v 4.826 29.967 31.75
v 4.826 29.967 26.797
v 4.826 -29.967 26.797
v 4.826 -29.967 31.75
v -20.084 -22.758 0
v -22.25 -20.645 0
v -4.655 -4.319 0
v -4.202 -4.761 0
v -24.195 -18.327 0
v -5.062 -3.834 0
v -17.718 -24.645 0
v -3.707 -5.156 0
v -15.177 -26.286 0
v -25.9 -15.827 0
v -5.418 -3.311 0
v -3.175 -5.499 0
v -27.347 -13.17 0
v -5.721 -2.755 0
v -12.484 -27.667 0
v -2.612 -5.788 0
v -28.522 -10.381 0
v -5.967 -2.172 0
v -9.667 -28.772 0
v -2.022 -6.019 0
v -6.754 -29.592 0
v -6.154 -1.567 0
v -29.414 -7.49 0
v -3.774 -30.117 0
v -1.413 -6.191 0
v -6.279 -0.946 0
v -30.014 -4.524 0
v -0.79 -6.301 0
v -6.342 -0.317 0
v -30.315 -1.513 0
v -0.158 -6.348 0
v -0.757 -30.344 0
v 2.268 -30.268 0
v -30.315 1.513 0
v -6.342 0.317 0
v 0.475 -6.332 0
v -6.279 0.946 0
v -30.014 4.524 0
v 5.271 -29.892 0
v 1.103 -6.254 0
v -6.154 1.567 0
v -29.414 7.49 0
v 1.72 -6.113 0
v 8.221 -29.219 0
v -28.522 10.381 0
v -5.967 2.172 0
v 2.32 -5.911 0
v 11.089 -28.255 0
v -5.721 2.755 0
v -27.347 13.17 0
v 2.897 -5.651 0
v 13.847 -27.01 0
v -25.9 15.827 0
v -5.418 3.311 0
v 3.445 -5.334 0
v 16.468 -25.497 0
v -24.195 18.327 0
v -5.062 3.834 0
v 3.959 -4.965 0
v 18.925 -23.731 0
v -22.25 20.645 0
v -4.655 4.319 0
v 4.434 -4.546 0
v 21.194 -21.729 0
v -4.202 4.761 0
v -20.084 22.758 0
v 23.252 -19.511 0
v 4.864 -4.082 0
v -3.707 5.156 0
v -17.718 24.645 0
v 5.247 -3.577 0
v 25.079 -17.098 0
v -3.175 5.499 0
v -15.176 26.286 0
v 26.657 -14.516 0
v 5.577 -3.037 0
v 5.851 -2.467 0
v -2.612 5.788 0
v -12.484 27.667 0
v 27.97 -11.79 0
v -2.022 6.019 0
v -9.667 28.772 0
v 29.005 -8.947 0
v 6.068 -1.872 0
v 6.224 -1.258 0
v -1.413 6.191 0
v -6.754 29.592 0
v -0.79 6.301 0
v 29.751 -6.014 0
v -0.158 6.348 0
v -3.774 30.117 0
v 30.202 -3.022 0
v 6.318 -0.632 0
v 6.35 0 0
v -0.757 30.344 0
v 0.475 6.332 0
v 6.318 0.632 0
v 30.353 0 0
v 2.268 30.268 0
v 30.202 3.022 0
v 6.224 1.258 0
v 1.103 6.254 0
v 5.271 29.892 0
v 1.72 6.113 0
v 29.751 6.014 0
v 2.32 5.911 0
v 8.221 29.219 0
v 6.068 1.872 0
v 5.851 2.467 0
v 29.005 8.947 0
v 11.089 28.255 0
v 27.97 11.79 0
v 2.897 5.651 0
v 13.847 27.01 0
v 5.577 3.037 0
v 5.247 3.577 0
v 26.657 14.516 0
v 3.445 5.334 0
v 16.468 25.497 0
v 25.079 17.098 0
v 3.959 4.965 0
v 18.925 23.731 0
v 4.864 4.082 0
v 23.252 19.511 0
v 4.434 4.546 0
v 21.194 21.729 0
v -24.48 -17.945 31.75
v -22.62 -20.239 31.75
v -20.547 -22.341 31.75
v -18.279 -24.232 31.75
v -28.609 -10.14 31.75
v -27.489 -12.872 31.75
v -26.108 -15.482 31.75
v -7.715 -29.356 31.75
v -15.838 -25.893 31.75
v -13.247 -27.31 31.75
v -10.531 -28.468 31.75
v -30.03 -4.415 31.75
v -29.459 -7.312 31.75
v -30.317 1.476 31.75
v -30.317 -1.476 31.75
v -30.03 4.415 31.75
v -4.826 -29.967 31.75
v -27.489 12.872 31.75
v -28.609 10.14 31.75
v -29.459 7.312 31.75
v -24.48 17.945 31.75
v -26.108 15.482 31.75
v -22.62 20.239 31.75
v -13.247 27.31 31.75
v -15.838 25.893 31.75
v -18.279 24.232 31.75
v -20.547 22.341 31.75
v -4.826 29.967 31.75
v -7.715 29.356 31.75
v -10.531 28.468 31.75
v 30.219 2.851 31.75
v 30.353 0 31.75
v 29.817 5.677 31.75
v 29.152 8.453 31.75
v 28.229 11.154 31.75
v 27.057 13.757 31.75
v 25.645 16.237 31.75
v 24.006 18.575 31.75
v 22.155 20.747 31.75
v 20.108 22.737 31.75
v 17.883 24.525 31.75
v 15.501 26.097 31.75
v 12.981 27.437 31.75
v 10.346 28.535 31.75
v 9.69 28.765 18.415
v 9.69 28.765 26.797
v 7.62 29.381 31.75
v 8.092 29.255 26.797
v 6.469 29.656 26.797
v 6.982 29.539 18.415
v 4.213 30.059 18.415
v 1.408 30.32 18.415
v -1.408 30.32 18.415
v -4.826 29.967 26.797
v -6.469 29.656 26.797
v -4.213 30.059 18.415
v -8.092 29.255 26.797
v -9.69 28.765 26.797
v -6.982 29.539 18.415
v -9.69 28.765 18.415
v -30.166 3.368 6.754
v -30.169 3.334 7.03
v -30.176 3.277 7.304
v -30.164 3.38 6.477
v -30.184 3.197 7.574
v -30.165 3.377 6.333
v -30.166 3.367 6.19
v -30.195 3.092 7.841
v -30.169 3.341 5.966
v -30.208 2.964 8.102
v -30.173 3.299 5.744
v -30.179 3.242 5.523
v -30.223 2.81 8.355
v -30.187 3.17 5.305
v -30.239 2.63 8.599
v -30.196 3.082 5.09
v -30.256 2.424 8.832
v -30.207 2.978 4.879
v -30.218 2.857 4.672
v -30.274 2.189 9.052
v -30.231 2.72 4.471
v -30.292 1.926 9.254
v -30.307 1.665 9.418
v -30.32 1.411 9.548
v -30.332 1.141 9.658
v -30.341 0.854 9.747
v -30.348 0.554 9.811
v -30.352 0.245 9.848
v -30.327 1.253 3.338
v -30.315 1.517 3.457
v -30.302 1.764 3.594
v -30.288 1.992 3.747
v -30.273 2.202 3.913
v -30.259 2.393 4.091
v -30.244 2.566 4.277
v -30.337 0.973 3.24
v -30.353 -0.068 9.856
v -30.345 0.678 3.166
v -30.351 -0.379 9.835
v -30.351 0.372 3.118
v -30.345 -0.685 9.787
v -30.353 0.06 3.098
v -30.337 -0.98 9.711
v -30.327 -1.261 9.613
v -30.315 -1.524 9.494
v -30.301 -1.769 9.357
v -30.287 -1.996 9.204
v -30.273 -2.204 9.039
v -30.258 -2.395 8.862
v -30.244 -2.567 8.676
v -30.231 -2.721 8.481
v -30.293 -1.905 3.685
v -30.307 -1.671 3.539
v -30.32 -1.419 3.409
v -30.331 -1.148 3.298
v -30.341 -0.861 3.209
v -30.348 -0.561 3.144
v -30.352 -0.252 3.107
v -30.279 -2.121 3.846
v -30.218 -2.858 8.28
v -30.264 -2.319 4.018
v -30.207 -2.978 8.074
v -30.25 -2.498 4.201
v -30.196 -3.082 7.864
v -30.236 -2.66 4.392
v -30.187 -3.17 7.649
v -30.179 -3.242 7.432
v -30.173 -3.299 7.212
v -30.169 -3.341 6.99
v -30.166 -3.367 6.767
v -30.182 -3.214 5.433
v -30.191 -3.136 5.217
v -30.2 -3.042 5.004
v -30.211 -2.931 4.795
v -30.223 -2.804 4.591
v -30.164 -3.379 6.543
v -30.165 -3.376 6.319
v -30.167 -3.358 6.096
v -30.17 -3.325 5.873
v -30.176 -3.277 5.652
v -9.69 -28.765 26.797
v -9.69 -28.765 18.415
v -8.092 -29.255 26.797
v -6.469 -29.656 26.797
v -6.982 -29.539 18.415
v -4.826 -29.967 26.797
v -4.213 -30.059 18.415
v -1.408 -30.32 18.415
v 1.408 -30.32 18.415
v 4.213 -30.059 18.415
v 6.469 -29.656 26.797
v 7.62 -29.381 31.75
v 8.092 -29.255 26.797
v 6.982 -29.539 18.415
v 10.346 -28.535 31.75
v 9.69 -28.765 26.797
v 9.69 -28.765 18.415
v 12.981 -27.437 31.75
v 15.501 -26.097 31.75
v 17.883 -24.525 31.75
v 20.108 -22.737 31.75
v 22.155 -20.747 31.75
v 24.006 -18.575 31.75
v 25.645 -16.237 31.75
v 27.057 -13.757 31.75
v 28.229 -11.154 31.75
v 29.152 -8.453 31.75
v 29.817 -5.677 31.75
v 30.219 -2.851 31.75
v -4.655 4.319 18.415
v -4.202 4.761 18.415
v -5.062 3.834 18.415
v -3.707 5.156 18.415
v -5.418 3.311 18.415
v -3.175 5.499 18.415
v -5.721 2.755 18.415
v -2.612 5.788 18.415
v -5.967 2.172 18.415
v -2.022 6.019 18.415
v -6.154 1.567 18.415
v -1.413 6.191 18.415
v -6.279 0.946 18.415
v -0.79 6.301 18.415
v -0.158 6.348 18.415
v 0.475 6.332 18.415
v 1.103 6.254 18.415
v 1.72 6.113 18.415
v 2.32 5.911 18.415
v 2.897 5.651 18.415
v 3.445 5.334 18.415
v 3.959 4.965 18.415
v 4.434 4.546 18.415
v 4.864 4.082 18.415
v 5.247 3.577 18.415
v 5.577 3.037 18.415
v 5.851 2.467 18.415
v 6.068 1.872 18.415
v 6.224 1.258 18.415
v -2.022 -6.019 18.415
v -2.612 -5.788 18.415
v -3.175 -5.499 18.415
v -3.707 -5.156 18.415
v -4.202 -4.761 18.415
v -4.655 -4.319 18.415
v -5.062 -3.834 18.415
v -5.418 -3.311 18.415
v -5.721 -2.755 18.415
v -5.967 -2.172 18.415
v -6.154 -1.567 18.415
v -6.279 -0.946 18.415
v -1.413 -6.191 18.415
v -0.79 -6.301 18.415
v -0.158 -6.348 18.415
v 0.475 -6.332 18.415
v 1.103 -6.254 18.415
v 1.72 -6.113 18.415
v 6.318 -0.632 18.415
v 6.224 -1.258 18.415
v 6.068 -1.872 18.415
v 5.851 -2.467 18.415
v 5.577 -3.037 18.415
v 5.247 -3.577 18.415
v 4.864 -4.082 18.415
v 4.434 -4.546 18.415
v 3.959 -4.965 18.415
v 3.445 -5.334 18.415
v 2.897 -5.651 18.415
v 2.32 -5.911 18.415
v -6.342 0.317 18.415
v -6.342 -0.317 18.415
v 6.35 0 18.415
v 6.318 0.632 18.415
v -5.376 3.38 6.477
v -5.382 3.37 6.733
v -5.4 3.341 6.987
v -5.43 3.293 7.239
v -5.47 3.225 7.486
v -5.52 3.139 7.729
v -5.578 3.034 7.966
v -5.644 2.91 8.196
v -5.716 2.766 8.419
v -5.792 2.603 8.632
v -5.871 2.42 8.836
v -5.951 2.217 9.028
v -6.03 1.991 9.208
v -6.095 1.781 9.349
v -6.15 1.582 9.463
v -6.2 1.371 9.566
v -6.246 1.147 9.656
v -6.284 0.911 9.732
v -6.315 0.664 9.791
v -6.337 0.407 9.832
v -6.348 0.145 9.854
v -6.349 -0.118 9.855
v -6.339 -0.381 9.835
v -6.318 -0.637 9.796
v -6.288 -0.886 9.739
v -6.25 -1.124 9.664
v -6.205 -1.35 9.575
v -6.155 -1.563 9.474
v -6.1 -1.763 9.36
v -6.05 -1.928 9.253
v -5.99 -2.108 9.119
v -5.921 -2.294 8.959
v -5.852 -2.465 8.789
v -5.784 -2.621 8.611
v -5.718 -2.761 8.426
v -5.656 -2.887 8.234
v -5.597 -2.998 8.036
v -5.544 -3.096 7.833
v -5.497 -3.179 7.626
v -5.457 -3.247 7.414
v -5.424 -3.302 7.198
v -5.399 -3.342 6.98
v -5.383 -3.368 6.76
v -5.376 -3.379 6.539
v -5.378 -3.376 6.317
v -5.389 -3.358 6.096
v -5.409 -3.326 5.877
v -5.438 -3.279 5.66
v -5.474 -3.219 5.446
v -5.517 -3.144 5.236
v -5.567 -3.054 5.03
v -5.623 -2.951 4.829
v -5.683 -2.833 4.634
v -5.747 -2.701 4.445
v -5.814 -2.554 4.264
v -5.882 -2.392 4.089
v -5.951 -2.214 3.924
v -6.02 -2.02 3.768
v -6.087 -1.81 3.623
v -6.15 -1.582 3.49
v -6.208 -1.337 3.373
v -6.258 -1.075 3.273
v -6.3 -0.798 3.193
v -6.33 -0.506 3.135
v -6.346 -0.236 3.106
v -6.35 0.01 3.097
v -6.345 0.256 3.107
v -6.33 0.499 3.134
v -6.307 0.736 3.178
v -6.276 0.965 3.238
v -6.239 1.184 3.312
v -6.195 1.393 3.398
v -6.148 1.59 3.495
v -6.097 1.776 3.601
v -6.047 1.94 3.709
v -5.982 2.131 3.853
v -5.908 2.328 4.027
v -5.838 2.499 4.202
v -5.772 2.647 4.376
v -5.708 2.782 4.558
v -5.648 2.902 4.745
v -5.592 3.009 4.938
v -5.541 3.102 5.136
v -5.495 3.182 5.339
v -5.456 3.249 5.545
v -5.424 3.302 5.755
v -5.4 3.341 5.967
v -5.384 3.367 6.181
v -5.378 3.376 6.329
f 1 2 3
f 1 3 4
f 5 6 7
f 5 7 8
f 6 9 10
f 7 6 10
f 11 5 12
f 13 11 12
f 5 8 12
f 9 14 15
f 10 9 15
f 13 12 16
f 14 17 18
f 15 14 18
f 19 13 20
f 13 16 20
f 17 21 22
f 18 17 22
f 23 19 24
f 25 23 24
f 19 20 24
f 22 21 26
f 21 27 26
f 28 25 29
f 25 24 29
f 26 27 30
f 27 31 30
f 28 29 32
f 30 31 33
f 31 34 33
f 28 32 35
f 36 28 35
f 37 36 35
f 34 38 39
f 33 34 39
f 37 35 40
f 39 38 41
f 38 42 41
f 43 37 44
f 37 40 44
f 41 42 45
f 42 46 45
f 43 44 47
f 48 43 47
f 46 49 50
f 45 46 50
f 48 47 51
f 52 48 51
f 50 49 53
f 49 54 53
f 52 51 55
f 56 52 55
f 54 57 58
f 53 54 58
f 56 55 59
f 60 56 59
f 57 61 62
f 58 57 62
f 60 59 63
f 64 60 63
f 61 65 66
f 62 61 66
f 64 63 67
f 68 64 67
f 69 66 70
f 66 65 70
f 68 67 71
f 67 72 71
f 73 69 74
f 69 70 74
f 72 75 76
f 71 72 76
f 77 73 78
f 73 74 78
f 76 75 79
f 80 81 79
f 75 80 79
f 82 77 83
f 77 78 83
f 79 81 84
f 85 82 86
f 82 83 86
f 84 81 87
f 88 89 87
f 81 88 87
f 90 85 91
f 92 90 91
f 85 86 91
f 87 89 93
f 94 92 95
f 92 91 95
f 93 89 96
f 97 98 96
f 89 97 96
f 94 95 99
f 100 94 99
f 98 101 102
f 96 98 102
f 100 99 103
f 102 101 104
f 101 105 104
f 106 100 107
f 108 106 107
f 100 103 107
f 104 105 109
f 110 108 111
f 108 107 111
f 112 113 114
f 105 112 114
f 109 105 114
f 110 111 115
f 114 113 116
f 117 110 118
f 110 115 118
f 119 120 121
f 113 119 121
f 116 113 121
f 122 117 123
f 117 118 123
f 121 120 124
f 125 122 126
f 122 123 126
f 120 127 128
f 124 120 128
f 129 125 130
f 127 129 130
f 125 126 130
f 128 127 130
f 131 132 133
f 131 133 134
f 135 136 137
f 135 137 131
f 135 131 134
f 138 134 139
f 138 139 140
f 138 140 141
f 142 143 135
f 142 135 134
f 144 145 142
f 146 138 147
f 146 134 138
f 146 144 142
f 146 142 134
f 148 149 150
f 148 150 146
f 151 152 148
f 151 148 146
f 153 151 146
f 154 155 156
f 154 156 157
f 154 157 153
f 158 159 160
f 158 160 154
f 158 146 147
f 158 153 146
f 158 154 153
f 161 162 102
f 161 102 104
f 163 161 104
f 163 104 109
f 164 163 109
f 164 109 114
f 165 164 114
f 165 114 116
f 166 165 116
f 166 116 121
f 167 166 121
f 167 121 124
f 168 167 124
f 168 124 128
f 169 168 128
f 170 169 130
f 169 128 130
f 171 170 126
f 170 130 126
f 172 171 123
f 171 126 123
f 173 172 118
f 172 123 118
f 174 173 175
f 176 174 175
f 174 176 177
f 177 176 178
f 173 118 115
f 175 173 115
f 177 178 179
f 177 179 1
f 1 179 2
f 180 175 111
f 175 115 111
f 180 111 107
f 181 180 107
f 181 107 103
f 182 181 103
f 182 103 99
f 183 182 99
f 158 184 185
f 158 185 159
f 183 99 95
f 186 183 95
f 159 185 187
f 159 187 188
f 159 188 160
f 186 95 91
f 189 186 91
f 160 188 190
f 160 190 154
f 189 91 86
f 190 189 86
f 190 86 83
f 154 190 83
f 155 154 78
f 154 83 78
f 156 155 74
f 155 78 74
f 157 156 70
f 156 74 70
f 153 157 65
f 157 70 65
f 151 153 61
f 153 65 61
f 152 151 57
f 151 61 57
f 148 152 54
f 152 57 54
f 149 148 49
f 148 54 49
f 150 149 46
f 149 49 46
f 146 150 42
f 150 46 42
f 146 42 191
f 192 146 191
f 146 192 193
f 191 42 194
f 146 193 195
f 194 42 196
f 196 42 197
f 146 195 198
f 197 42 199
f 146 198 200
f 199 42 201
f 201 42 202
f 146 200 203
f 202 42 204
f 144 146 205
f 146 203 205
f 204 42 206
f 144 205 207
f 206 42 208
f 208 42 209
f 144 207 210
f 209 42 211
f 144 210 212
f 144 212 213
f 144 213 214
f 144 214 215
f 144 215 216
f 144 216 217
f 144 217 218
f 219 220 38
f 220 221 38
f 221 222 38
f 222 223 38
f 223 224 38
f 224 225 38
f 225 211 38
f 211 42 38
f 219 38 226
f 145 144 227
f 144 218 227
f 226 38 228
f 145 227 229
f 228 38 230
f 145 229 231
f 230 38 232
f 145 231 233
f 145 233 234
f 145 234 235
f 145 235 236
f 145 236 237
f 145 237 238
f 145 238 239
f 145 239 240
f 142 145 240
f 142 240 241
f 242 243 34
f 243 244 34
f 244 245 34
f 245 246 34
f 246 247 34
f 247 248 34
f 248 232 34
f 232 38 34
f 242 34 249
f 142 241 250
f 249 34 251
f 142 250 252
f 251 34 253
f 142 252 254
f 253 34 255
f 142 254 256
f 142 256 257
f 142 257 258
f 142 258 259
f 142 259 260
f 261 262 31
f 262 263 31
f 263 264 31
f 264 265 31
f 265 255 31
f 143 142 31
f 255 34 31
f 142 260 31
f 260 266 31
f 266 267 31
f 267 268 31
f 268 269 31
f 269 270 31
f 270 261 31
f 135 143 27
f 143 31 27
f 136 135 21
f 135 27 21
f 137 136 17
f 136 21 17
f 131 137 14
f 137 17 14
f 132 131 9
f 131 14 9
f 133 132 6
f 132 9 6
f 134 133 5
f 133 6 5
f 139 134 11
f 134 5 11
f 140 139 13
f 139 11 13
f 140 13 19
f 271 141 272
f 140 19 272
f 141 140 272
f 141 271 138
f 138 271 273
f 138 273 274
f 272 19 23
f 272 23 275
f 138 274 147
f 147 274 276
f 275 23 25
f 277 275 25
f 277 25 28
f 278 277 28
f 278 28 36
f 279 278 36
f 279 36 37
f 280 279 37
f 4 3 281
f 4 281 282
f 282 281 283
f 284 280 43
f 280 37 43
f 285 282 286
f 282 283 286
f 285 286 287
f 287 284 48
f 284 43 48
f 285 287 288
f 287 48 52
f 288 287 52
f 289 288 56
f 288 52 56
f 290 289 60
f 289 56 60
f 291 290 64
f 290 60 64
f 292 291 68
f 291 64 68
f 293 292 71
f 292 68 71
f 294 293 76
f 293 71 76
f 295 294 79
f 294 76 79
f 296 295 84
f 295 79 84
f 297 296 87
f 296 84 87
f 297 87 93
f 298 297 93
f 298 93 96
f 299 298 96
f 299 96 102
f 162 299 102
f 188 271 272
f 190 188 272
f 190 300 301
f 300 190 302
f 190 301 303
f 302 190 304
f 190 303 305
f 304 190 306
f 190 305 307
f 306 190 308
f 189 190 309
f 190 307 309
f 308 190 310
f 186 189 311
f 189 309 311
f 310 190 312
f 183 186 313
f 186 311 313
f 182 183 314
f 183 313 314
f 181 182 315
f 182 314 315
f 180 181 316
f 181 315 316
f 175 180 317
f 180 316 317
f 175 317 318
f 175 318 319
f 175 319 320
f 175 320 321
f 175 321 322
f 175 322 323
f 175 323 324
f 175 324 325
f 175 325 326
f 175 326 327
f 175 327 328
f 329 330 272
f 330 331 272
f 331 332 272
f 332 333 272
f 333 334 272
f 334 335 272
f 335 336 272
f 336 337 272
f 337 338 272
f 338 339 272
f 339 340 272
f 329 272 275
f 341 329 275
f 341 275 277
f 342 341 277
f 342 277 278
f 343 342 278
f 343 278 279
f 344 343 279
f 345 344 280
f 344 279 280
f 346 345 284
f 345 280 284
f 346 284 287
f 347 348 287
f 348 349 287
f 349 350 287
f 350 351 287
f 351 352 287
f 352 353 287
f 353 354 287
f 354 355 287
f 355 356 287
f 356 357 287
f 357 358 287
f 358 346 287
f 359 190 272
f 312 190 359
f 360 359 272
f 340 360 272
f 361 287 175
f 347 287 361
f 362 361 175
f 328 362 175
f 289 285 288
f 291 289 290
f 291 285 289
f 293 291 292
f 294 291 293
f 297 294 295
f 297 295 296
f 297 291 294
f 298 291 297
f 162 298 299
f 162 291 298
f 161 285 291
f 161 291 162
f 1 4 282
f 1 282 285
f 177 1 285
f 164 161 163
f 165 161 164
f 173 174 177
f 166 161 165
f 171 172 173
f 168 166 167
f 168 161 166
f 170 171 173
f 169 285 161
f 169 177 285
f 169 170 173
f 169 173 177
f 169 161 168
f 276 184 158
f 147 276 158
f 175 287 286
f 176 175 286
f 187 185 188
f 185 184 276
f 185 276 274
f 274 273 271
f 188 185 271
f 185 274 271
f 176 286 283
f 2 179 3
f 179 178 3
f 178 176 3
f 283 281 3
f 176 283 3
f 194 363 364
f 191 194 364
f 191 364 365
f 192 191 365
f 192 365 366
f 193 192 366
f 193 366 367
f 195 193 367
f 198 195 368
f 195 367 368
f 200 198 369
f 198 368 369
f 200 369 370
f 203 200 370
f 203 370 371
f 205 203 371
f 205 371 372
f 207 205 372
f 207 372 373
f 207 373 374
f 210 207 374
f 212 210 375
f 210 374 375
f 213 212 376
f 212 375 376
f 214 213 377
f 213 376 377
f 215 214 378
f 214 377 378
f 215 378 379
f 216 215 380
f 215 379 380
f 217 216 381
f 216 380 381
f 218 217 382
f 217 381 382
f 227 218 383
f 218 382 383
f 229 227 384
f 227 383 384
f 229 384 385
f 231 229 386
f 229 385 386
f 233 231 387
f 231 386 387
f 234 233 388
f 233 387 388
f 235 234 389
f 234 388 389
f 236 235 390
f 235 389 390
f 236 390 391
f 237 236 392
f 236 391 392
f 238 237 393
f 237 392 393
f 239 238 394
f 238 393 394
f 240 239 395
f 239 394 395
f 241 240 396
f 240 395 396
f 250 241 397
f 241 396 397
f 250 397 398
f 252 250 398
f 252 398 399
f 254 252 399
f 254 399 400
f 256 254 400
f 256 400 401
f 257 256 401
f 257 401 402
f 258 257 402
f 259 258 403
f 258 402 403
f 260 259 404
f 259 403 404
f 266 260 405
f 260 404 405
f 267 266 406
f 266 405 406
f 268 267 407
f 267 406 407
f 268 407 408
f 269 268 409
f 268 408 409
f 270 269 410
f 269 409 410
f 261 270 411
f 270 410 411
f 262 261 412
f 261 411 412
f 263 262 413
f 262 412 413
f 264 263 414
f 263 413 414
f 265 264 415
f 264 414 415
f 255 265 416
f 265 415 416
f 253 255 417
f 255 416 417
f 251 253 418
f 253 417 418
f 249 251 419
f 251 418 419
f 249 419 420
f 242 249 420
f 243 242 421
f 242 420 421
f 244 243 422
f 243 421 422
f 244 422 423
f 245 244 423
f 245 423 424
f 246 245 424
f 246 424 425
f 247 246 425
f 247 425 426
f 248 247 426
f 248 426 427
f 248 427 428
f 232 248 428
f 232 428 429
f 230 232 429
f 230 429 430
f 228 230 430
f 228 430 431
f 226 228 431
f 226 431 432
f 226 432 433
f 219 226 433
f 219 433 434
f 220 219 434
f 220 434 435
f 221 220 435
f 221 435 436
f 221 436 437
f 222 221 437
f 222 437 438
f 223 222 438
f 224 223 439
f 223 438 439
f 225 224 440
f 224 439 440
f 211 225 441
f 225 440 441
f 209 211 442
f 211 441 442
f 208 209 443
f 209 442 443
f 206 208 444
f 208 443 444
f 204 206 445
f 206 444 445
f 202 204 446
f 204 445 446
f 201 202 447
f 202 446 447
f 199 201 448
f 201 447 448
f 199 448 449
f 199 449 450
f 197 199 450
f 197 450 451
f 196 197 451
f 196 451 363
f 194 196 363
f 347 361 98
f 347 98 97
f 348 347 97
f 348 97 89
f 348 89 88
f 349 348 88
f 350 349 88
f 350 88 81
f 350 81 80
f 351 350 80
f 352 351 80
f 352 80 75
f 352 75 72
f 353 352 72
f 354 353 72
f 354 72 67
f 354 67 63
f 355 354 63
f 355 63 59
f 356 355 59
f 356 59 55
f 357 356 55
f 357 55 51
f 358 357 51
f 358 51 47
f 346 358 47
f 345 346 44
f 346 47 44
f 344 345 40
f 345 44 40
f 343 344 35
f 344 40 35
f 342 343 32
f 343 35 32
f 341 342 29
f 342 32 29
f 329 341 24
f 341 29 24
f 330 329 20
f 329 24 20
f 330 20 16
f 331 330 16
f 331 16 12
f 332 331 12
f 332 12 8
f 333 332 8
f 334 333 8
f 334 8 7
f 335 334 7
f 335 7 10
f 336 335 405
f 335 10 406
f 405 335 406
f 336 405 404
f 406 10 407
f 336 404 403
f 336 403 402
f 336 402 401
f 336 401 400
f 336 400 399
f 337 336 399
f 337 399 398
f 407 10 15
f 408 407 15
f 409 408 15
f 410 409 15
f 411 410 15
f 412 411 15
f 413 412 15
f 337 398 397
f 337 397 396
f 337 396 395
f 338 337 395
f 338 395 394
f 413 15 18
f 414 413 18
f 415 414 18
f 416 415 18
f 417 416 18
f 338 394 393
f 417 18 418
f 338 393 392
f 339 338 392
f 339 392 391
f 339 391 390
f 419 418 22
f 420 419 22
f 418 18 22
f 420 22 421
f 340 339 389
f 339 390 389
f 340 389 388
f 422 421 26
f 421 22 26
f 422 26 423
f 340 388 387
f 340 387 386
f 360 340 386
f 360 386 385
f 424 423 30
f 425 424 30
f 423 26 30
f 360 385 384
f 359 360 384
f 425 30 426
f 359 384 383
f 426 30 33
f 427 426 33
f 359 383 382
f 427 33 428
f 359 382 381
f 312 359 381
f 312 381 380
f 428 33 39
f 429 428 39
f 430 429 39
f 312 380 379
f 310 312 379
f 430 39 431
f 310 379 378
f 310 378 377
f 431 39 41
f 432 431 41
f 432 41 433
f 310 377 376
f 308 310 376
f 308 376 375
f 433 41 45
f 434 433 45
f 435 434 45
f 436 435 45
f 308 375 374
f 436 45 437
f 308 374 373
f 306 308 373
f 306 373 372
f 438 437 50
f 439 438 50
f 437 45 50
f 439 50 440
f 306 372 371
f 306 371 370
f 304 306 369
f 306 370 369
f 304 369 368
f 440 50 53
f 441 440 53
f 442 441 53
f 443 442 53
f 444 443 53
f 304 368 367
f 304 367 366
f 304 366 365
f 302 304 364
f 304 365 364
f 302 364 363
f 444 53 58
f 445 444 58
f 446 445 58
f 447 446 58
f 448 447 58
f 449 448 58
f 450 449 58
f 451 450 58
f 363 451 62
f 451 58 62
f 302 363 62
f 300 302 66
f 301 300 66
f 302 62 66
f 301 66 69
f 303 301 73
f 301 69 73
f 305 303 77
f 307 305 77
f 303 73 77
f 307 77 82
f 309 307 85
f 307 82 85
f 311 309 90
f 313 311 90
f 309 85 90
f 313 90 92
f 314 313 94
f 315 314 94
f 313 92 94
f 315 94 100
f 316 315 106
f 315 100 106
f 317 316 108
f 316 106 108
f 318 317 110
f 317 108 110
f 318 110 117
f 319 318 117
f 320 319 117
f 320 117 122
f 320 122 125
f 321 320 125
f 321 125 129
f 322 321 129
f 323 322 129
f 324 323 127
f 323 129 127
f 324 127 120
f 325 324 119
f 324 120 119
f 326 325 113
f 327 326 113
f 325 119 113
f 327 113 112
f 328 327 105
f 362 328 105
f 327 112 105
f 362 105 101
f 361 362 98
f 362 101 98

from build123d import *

# Parameters (mm, degrees)
F0_R     = 30.353
F1_DEPTH = 31.75
F2_R     = 6.35
F3_DEPTH = 18.415
F4_W     = 9.652
F4_H     = 6.5577
F5_DEPTH = 30.353
F6_R     = 3.379702
F7_DEPTH = 60.706


with BuildPart() as f1:
    # F0 (on Top) → F1 (new body)
    with BuildSketch(Plane.XY):
        Circle(F0_R)
    extrude(amount=F1_DEPTH)

    # F2 (on face) → F3 (cut)
    with BuildSketch(Plane(origin=(0, 0, 0), x_dir=(1, 0, 0), z_dir=(0, 0, -1))):
        Circle(F2_R)
    extrude(amount=-F3_DEPTH, mode=Mode.SUBTRACT)

    # F4 (on Front) → F5 (cut, symmetric)
    with BuildSketch(Plane.XZ):
        Polygon((-4.826, 26.797), (-9.6901, 26.797), (-9.6901, 18.415), (9.6901, 18.415), (9.6901, 26.797), (4.826, 26.797), align=None)
        with Locations((0, 30.07585)):
            Rectangle(F4_W, F4_H)
    extrude(amount=F5_DEPTH, both=True, mode=Mode.SUBTRACT)

    # F6 (on Right) → F7 (cut)
    with BuildSketch(Plane.YZ):
        with Locations((0, 6.477)):
            Circle(F6_R)
    extrude(amount=-F7_DEPTH, mode=Mode.SUBTRACT)


solid = f1.part
